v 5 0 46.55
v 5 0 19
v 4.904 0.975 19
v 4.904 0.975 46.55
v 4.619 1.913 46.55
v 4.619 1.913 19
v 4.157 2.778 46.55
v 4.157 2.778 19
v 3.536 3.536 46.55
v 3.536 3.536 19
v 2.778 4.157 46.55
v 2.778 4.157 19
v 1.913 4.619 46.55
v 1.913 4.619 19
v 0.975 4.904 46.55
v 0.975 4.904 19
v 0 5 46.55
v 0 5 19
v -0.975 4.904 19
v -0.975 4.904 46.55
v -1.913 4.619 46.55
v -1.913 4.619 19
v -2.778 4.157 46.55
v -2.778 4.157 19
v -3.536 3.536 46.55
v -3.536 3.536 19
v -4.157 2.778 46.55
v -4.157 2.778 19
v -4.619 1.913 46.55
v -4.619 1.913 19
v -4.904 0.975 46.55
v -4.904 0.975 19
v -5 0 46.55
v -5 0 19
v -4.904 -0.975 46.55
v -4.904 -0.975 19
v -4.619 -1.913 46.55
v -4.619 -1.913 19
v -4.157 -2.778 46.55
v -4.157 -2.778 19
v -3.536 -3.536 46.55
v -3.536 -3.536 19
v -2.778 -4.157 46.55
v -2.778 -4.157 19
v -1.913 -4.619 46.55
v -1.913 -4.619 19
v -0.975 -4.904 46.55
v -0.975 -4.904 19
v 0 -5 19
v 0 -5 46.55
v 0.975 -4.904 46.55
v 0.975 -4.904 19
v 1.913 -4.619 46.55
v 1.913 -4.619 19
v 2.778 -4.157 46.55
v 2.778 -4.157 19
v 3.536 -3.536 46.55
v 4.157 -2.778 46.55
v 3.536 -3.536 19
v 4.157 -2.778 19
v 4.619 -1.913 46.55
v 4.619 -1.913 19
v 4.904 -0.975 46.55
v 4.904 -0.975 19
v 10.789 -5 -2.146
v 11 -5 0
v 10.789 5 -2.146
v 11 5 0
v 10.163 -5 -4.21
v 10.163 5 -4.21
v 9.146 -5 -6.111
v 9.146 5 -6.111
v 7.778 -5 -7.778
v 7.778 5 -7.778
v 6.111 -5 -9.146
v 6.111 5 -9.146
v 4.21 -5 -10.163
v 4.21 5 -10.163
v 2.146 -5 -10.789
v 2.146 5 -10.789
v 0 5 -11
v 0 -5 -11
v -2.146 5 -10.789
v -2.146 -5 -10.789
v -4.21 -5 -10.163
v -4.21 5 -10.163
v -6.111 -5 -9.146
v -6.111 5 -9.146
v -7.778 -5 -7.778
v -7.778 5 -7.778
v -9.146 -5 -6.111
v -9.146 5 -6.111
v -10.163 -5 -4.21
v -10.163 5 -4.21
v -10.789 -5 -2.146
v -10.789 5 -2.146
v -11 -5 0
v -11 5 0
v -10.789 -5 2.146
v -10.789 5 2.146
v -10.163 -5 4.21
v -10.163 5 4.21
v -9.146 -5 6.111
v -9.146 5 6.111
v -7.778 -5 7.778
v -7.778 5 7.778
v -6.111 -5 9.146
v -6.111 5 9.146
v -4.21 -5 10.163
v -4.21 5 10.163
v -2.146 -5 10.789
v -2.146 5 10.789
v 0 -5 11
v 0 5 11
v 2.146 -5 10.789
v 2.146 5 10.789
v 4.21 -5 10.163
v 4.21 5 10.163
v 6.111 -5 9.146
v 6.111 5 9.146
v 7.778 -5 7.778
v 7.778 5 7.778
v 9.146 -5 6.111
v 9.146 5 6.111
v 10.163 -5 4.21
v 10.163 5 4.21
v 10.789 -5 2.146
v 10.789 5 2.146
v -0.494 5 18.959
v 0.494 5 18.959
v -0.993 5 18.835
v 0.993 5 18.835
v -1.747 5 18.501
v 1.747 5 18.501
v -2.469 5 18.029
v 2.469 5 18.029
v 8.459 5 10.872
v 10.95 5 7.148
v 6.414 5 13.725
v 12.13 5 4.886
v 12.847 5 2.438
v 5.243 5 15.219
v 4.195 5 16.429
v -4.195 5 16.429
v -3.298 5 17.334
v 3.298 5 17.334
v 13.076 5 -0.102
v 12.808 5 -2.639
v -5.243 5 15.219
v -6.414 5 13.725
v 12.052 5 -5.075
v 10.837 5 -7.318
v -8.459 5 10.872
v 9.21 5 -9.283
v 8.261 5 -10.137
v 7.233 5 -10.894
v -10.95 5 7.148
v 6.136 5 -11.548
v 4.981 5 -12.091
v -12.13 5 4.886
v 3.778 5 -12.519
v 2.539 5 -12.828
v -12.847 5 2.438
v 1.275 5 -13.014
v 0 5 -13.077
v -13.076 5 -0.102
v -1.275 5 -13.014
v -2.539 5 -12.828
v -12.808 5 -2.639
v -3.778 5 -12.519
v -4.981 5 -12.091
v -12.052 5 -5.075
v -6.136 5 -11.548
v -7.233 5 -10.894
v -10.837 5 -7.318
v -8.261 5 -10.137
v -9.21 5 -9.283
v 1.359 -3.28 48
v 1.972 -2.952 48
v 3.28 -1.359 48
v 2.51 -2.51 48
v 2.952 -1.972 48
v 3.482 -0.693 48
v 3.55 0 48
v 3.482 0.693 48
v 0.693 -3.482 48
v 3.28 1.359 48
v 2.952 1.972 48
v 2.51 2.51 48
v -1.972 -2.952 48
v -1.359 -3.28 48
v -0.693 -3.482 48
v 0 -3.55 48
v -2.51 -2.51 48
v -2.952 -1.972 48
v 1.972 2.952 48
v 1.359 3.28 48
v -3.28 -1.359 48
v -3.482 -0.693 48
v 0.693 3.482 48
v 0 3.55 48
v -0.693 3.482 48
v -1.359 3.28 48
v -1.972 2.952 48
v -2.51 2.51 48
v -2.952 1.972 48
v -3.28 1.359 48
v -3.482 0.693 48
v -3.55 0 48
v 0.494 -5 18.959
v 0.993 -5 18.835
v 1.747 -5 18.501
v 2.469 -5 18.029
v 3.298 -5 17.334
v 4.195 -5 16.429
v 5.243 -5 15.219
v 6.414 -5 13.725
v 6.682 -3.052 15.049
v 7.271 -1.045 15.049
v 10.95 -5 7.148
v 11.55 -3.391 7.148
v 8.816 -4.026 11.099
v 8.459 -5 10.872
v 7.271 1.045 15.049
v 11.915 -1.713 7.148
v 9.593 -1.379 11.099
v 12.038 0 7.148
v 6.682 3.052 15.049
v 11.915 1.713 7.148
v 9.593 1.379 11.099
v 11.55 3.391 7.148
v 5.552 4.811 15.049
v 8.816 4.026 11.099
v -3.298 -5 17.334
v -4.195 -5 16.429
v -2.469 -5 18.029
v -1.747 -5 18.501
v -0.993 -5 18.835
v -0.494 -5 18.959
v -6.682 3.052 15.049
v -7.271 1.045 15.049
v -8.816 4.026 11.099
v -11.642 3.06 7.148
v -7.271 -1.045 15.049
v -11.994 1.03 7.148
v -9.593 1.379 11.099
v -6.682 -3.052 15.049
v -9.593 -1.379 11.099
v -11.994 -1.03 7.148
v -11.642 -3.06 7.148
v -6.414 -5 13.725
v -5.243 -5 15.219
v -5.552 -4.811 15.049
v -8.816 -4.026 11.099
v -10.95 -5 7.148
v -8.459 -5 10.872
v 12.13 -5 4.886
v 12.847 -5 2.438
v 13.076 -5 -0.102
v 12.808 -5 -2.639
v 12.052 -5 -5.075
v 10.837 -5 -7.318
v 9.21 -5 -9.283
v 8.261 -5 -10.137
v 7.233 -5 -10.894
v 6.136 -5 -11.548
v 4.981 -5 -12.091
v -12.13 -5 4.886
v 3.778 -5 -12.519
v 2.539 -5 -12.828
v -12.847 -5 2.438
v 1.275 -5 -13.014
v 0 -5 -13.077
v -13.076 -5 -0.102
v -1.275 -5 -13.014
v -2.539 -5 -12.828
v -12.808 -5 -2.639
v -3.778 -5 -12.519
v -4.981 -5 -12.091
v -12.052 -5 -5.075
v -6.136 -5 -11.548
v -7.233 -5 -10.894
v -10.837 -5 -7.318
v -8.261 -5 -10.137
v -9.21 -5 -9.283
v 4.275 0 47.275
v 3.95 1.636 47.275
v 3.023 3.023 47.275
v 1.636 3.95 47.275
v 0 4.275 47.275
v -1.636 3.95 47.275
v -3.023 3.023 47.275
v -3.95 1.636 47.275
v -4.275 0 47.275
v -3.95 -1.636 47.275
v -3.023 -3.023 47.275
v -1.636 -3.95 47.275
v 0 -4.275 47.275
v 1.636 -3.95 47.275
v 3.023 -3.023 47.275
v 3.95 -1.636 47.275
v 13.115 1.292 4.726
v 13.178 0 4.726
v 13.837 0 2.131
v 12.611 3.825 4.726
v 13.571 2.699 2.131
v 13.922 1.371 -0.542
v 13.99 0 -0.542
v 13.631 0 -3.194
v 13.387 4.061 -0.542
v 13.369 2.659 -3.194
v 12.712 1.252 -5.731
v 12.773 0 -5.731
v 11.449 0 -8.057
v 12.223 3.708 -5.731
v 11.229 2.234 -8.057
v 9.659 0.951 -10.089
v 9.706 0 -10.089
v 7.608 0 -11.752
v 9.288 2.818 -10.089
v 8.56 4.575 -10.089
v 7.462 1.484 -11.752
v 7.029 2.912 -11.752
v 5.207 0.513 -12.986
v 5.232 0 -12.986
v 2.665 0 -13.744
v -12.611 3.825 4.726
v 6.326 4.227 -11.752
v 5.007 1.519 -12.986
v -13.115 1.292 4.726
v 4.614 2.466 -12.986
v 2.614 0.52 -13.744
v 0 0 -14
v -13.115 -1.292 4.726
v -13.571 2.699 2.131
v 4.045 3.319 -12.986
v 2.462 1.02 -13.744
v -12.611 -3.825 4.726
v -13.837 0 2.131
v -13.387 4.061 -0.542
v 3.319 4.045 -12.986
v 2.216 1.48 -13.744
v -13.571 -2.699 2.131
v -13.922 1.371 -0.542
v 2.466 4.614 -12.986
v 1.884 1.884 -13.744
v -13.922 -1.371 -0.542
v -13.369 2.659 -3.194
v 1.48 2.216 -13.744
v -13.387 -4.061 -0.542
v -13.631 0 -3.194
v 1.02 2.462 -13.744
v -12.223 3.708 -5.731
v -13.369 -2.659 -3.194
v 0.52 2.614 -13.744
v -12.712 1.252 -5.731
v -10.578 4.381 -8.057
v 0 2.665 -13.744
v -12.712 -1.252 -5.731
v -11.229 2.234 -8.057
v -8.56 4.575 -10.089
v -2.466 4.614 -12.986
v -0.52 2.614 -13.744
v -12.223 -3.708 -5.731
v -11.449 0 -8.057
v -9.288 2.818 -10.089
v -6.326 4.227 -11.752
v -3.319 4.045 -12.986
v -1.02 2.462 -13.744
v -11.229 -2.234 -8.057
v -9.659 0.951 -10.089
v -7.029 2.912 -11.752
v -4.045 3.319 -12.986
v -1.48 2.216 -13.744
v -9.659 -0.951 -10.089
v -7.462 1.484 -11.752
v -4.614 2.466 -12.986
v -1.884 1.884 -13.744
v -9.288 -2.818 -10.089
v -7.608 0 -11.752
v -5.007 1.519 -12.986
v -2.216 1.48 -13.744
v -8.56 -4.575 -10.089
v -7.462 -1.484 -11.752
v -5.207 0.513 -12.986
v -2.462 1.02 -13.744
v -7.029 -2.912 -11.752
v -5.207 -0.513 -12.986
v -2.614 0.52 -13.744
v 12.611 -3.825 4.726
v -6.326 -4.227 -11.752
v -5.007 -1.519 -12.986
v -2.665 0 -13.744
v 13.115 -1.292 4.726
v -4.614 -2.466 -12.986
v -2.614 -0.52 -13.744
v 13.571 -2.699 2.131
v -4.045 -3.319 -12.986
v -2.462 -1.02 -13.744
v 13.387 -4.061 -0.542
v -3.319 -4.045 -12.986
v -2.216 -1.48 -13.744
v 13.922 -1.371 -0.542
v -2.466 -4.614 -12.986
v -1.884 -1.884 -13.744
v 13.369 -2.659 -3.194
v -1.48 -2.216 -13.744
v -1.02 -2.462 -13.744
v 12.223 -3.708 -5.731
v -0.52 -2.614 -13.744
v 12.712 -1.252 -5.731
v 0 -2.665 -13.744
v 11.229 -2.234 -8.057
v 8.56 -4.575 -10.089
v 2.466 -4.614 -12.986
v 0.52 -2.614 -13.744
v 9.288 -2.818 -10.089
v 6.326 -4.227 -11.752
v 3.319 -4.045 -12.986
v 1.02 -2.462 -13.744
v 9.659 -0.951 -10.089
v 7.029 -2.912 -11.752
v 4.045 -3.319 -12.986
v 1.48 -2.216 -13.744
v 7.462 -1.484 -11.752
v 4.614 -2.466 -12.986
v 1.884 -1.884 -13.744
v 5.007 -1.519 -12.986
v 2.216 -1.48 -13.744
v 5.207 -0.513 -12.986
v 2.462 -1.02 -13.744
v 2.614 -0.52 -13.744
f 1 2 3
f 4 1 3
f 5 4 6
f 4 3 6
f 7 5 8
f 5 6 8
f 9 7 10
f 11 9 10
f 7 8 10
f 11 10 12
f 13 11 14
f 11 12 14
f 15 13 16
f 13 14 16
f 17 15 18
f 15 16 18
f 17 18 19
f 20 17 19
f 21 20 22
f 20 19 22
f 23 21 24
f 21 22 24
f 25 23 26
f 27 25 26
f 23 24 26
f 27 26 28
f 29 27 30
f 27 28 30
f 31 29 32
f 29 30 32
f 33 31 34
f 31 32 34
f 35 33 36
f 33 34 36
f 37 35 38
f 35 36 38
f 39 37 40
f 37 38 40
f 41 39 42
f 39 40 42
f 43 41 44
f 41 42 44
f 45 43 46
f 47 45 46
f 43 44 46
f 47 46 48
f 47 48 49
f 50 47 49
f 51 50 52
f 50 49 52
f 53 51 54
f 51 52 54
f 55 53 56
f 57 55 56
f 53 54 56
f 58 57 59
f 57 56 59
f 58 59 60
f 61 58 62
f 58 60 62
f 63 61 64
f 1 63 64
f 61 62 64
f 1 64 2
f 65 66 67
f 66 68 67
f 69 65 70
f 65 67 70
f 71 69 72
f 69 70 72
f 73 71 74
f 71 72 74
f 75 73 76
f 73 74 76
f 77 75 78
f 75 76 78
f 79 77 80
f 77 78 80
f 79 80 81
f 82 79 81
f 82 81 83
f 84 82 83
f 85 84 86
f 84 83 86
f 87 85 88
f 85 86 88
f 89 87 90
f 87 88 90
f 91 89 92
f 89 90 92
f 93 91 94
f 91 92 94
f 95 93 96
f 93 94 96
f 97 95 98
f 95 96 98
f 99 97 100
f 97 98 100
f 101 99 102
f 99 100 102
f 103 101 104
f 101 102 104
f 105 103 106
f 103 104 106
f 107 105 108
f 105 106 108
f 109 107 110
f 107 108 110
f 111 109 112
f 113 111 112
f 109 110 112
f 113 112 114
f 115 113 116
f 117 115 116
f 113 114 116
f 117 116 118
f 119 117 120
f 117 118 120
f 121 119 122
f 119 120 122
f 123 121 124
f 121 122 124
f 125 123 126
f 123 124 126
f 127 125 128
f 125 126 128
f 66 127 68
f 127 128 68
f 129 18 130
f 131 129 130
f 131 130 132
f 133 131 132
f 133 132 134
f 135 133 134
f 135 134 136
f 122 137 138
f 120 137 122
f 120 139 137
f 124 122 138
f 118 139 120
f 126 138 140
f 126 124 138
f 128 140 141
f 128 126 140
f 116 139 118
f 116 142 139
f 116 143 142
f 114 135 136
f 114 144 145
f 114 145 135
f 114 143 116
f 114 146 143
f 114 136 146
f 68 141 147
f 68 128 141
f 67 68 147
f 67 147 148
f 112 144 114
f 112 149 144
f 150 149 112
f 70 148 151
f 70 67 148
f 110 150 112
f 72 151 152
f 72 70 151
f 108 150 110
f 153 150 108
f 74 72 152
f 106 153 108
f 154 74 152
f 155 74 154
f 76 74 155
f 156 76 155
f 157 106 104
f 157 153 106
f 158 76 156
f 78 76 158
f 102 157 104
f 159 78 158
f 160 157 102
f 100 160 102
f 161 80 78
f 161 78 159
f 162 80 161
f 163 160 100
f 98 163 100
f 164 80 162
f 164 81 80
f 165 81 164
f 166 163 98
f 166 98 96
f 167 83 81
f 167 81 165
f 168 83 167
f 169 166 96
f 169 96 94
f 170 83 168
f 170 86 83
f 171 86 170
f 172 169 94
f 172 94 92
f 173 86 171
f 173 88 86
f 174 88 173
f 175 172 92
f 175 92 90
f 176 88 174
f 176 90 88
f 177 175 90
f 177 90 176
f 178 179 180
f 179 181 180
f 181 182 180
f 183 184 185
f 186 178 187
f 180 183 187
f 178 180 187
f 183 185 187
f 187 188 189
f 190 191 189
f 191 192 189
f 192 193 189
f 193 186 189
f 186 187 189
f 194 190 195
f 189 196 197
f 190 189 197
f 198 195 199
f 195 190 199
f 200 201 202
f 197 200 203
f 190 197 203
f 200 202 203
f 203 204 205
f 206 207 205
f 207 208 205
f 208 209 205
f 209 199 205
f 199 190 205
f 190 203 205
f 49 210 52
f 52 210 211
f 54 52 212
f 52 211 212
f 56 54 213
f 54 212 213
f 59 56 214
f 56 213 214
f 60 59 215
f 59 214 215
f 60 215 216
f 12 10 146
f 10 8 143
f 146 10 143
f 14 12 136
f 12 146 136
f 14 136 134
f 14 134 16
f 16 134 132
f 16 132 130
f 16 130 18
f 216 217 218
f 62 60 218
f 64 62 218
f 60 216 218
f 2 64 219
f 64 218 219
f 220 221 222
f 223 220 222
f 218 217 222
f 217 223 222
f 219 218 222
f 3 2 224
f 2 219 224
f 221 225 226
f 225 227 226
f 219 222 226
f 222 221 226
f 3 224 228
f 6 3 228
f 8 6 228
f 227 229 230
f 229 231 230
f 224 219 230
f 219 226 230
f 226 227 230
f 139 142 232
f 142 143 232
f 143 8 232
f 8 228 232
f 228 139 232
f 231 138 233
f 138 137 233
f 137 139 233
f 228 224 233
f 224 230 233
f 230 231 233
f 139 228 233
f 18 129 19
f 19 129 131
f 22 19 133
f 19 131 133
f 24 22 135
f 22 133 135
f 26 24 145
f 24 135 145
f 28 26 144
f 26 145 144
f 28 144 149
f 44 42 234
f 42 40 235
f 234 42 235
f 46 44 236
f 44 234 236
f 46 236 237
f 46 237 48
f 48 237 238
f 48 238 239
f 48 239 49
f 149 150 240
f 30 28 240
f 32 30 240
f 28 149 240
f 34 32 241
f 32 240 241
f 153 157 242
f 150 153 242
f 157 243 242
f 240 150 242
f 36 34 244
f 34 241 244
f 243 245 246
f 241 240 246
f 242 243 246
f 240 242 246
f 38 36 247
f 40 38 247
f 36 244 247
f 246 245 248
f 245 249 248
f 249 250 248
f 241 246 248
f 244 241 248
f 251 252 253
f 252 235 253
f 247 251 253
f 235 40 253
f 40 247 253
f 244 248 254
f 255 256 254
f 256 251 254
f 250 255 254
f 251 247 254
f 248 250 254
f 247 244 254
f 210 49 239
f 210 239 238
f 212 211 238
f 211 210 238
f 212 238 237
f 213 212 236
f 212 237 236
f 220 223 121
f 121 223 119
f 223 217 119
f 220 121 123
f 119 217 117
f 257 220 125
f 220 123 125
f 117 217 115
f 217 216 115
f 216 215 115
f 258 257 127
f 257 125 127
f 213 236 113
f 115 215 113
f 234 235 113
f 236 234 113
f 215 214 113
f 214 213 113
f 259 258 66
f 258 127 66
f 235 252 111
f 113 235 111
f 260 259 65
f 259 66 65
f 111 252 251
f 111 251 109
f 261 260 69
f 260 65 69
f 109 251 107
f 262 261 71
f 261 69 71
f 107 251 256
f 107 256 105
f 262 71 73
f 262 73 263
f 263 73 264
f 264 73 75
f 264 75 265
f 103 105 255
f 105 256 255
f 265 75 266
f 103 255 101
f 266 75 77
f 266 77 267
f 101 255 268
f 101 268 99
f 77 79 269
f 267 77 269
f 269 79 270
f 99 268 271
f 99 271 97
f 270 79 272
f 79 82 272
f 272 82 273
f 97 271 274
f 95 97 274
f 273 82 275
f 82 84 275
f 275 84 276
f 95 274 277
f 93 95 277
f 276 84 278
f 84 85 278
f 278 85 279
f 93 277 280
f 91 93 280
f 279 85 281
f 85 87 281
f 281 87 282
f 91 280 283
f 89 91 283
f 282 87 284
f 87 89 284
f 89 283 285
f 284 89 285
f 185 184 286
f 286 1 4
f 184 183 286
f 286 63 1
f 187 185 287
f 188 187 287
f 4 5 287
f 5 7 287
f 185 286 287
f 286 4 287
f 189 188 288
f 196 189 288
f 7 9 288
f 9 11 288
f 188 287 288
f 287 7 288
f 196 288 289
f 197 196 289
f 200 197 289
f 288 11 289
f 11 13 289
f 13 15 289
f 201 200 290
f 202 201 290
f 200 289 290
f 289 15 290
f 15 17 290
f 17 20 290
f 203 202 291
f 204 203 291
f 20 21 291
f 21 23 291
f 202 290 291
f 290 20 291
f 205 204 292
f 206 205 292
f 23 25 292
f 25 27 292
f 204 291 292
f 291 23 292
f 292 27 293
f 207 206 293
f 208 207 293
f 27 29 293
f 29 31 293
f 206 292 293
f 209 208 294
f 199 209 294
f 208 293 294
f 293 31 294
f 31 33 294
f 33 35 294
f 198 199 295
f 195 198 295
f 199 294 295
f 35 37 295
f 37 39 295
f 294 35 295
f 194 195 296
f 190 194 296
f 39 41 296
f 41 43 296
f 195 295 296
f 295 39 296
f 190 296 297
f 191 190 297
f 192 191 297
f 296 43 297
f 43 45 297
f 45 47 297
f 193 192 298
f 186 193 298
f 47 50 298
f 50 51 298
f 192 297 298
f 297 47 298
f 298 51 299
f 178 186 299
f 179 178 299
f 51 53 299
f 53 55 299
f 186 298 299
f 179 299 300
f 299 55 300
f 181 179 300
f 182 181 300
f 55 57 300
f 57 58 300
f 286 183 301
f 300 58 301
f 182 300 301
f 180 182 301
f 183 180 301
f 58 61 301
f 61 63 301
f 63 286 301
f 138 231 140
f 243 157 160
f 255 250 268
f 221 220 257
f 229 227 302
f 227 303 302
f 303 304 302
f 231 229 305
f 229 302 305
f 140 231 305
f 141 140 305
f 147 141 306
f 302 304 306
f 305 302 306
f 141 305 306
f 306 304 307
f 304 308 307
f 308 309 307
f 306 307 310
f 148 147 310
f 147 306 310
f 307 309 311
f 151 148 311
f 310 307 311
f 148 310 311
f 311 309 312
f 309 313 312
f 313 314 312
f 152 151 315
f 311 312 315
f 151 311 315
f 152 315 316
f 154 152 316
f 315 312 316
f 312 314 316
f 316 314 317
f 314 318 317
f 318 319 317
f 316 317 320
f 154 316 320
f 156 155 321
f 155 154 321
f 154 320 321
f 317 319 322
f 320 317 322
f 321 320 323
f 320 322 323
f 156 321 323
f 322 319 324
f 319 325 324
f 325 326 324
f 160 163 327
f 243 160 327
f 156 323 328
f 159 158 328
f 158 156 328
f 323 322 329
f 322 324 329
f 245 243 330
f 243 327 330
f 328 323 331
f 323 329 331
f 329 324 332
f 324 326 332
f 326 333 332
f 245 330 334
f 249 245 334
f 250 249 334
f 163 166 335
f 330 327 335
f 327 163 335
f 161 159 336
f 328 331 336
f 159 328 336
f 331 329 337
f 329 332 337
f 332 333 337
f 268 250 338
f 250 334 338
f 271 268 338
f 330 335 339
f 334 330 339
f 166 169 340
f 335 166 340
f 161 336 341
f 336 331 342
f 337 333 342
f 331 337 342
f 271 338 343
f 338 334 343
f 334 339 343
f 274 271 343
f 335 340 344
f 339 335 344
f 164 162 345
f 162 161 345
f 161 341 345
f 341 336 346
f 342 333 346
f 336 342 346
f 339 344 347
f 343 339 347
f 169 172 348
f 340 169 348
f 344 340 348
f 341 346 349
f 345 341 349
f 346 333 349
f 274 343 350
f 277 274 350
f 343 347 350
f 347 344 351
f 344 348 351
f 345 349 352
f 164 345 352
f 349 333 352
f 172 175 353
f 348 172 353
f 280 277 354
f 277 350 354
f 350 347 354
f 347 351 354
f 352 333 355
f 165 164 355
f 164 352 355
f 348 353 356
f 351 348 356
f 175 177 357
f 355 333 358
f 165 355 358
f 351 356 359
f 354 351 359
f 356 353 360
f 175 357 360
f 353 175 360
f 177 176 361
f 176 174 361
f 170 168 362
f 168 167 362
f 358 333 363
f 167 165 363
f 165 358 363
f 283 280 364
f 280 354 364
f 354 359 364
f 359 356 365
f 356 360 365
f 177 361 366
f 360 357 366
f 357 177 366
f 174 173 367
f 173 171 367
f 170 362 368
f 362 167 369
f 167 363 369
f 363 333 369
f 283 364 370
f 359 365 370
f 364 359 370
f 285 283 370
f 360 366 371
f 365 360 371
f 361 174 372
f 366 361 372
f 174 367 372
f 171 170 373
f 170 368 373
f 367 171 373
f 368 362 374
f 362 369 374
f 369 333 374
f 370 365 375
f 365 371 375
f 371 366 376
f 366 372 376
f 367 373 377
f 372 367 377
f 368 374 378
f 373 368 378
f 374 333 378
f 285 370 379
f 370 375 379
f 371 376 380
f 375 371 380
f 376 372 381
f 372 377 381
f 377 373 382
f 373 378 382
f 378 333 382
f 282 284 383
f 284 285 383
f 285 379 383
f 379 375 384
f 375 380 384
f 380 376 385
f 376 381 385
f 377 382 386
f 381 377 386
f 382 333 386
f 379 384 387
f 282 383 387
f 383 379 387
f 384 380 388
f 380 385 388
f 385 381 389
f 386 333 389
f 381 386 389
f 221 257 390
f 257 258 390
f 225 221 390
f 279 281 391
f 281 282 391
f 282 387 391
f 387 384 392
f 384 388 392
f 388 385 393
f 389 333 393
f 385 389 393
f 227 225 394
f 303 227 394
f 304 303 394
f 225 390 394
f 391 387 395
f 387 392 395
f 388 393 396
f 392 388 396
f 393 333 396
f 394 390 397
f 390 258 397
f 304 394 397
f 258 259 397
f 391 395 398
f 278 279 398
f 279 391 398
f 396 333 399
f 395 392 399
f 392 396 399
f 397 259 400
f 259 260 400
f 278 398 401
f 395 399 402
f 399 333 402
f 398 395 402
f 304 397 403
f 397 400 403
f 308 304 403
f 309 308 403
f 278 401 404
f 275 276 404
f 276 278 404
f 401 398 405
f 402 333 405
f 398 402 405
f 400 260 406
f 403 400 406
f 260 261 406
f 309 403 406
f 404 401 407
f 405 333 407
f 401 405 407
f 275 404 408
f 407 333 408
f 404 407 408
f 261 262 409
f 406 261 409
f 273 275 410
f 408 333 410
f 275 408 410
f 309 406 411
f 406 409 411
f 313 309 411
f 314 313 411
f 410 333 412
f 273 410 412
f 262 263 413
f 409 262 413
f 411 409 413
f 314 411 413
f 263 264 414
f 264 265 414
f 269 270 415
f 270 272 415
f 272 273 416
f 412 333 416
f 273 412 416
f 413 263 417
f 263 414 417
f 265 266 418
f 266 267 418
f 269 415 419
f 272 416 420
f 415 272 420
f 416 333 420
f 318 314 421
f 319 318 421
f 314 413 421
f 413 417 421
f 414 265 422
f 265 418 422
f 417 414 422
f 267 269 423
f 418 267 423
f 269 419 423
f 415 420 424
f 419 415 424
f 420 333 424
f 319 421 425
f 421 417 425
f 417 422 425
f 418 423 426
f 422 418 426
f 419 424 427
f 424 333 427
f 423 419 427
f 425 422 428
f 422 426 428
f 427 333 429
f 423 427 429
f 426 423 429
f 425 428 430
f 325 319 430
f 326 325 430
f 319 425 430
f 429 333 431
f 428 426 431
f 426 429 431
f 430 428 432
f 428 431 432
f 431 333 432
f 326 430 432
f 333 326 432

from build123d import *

# Parameters (mm, degrees)
SZKIC1_W                        = 5
SZKIC1_H                        = 29
WYTNIJ_WYCI_GNI_CIE1_DEPTH      = 15
WYTNIJ_WYCI_GNI_CIE1_DEPTH_BACK = 15
SZKIC3_R                        = 11
WYTNIJ_WYCI_GNI_CIE2_DEPTH      = 6
WYTNIJ_WYCI_GNI_CIE2_DEPTH_BACK = 6
SFAZOWANIE1_SIZE                = 1.45


with BuildPart() as part:
    # Szkic1 → Obrót1 (revolve)
    with BuildSketch(Plane(origin=(0, 0, 0), x_dir=(1, 0, 0), z_dir=(0, 1, 0))):
        with BuildLine():
            Line((0, 14), (0, -19))
            Line((0, -19), (5, -19))
            Line((5, -19), (12.037712352, -7.147970434))
            ThreePointArc((12.037712352, -7.147970434), (12.166996056, 6.925619609), (0, 14))
        make_face()
        with Locations((2.5, -33.5)):
            Rectangle(SZKIC1_W, SZKIC1_H)
    revolve(axis=Axis((0, 0, -26.043516498), (0, 0, 1)))

    # Szkic2 → Wytnij-wyciągnięcie1 (cut, two sides)
    with BuildSketch(Plane(origin=(0, 0, 0), x_dir=(0, 0, -1), z_dir=(1, 0, 0))) as wytnij_wyci_gni_cie1_sk:
        with BuildLine():
            Line((-19, 5), (13.076696831, 5))
            ThreePointArc((13.076696831, 5), (4.601064873, 13.222337238), (-7.147970434, 12.037712352))
            Line((-7.147970434, 12.037712352), (-19, 5))
        make_face()
        with BuildLine():
            Line((-19, -5), (13.076696831, -5))
            ThreePointArc((13.076696831, -5), (4.601064873, -13.222337238), (-7.147970434, -12.037712352))
            Line((-7.147970434, -12.037712352), (-19, -5))
        make_face()
    extrude(amount=WYTNIJ_WYCI_GNI_CIE1_DEPTH, mode=Mode.SUBTRACT)
    extrude(wytnij_wyci_gni_cie1_sk.sketch, amount=-WYTNIJ_WYCI_GNI_CIE1_DEPTH_BACK, mode=Mode.SUBTRACT)

    # Szkic3 → Wytnij-wyciągnięcie2 (cut, two sides)
    with BuildSketch(Plane(origin=(0, 0, 0), x_dir=(1, 0, 0), z_dir=(0, 1, 0))) as wytnij_wyci_gni_cie2_sk:
        Circle(SZKIC3_R)
    extrude(amount=WYTNIJ_WYCI_GNI_CIE2_DEPTH, mode=Mode.SUBTRACT)
    extrude(wytnij_wyci_gni_cie2_sk.sketch, amount=-WYTNIJ_WYCI_GNI_CIE2_DEPTH_BACK, mode=Mode.SUBTRACT)

    # Sfazowanie1
    sfazowanie1_edges = [part.edges().sort_by_distance(p)[0] for p in [
        (-5, 0, 48),
    ]]
    chamfer(sfazowanie1_edges, length=SFAZOWANIE1_SIZE)


solid = part.part
